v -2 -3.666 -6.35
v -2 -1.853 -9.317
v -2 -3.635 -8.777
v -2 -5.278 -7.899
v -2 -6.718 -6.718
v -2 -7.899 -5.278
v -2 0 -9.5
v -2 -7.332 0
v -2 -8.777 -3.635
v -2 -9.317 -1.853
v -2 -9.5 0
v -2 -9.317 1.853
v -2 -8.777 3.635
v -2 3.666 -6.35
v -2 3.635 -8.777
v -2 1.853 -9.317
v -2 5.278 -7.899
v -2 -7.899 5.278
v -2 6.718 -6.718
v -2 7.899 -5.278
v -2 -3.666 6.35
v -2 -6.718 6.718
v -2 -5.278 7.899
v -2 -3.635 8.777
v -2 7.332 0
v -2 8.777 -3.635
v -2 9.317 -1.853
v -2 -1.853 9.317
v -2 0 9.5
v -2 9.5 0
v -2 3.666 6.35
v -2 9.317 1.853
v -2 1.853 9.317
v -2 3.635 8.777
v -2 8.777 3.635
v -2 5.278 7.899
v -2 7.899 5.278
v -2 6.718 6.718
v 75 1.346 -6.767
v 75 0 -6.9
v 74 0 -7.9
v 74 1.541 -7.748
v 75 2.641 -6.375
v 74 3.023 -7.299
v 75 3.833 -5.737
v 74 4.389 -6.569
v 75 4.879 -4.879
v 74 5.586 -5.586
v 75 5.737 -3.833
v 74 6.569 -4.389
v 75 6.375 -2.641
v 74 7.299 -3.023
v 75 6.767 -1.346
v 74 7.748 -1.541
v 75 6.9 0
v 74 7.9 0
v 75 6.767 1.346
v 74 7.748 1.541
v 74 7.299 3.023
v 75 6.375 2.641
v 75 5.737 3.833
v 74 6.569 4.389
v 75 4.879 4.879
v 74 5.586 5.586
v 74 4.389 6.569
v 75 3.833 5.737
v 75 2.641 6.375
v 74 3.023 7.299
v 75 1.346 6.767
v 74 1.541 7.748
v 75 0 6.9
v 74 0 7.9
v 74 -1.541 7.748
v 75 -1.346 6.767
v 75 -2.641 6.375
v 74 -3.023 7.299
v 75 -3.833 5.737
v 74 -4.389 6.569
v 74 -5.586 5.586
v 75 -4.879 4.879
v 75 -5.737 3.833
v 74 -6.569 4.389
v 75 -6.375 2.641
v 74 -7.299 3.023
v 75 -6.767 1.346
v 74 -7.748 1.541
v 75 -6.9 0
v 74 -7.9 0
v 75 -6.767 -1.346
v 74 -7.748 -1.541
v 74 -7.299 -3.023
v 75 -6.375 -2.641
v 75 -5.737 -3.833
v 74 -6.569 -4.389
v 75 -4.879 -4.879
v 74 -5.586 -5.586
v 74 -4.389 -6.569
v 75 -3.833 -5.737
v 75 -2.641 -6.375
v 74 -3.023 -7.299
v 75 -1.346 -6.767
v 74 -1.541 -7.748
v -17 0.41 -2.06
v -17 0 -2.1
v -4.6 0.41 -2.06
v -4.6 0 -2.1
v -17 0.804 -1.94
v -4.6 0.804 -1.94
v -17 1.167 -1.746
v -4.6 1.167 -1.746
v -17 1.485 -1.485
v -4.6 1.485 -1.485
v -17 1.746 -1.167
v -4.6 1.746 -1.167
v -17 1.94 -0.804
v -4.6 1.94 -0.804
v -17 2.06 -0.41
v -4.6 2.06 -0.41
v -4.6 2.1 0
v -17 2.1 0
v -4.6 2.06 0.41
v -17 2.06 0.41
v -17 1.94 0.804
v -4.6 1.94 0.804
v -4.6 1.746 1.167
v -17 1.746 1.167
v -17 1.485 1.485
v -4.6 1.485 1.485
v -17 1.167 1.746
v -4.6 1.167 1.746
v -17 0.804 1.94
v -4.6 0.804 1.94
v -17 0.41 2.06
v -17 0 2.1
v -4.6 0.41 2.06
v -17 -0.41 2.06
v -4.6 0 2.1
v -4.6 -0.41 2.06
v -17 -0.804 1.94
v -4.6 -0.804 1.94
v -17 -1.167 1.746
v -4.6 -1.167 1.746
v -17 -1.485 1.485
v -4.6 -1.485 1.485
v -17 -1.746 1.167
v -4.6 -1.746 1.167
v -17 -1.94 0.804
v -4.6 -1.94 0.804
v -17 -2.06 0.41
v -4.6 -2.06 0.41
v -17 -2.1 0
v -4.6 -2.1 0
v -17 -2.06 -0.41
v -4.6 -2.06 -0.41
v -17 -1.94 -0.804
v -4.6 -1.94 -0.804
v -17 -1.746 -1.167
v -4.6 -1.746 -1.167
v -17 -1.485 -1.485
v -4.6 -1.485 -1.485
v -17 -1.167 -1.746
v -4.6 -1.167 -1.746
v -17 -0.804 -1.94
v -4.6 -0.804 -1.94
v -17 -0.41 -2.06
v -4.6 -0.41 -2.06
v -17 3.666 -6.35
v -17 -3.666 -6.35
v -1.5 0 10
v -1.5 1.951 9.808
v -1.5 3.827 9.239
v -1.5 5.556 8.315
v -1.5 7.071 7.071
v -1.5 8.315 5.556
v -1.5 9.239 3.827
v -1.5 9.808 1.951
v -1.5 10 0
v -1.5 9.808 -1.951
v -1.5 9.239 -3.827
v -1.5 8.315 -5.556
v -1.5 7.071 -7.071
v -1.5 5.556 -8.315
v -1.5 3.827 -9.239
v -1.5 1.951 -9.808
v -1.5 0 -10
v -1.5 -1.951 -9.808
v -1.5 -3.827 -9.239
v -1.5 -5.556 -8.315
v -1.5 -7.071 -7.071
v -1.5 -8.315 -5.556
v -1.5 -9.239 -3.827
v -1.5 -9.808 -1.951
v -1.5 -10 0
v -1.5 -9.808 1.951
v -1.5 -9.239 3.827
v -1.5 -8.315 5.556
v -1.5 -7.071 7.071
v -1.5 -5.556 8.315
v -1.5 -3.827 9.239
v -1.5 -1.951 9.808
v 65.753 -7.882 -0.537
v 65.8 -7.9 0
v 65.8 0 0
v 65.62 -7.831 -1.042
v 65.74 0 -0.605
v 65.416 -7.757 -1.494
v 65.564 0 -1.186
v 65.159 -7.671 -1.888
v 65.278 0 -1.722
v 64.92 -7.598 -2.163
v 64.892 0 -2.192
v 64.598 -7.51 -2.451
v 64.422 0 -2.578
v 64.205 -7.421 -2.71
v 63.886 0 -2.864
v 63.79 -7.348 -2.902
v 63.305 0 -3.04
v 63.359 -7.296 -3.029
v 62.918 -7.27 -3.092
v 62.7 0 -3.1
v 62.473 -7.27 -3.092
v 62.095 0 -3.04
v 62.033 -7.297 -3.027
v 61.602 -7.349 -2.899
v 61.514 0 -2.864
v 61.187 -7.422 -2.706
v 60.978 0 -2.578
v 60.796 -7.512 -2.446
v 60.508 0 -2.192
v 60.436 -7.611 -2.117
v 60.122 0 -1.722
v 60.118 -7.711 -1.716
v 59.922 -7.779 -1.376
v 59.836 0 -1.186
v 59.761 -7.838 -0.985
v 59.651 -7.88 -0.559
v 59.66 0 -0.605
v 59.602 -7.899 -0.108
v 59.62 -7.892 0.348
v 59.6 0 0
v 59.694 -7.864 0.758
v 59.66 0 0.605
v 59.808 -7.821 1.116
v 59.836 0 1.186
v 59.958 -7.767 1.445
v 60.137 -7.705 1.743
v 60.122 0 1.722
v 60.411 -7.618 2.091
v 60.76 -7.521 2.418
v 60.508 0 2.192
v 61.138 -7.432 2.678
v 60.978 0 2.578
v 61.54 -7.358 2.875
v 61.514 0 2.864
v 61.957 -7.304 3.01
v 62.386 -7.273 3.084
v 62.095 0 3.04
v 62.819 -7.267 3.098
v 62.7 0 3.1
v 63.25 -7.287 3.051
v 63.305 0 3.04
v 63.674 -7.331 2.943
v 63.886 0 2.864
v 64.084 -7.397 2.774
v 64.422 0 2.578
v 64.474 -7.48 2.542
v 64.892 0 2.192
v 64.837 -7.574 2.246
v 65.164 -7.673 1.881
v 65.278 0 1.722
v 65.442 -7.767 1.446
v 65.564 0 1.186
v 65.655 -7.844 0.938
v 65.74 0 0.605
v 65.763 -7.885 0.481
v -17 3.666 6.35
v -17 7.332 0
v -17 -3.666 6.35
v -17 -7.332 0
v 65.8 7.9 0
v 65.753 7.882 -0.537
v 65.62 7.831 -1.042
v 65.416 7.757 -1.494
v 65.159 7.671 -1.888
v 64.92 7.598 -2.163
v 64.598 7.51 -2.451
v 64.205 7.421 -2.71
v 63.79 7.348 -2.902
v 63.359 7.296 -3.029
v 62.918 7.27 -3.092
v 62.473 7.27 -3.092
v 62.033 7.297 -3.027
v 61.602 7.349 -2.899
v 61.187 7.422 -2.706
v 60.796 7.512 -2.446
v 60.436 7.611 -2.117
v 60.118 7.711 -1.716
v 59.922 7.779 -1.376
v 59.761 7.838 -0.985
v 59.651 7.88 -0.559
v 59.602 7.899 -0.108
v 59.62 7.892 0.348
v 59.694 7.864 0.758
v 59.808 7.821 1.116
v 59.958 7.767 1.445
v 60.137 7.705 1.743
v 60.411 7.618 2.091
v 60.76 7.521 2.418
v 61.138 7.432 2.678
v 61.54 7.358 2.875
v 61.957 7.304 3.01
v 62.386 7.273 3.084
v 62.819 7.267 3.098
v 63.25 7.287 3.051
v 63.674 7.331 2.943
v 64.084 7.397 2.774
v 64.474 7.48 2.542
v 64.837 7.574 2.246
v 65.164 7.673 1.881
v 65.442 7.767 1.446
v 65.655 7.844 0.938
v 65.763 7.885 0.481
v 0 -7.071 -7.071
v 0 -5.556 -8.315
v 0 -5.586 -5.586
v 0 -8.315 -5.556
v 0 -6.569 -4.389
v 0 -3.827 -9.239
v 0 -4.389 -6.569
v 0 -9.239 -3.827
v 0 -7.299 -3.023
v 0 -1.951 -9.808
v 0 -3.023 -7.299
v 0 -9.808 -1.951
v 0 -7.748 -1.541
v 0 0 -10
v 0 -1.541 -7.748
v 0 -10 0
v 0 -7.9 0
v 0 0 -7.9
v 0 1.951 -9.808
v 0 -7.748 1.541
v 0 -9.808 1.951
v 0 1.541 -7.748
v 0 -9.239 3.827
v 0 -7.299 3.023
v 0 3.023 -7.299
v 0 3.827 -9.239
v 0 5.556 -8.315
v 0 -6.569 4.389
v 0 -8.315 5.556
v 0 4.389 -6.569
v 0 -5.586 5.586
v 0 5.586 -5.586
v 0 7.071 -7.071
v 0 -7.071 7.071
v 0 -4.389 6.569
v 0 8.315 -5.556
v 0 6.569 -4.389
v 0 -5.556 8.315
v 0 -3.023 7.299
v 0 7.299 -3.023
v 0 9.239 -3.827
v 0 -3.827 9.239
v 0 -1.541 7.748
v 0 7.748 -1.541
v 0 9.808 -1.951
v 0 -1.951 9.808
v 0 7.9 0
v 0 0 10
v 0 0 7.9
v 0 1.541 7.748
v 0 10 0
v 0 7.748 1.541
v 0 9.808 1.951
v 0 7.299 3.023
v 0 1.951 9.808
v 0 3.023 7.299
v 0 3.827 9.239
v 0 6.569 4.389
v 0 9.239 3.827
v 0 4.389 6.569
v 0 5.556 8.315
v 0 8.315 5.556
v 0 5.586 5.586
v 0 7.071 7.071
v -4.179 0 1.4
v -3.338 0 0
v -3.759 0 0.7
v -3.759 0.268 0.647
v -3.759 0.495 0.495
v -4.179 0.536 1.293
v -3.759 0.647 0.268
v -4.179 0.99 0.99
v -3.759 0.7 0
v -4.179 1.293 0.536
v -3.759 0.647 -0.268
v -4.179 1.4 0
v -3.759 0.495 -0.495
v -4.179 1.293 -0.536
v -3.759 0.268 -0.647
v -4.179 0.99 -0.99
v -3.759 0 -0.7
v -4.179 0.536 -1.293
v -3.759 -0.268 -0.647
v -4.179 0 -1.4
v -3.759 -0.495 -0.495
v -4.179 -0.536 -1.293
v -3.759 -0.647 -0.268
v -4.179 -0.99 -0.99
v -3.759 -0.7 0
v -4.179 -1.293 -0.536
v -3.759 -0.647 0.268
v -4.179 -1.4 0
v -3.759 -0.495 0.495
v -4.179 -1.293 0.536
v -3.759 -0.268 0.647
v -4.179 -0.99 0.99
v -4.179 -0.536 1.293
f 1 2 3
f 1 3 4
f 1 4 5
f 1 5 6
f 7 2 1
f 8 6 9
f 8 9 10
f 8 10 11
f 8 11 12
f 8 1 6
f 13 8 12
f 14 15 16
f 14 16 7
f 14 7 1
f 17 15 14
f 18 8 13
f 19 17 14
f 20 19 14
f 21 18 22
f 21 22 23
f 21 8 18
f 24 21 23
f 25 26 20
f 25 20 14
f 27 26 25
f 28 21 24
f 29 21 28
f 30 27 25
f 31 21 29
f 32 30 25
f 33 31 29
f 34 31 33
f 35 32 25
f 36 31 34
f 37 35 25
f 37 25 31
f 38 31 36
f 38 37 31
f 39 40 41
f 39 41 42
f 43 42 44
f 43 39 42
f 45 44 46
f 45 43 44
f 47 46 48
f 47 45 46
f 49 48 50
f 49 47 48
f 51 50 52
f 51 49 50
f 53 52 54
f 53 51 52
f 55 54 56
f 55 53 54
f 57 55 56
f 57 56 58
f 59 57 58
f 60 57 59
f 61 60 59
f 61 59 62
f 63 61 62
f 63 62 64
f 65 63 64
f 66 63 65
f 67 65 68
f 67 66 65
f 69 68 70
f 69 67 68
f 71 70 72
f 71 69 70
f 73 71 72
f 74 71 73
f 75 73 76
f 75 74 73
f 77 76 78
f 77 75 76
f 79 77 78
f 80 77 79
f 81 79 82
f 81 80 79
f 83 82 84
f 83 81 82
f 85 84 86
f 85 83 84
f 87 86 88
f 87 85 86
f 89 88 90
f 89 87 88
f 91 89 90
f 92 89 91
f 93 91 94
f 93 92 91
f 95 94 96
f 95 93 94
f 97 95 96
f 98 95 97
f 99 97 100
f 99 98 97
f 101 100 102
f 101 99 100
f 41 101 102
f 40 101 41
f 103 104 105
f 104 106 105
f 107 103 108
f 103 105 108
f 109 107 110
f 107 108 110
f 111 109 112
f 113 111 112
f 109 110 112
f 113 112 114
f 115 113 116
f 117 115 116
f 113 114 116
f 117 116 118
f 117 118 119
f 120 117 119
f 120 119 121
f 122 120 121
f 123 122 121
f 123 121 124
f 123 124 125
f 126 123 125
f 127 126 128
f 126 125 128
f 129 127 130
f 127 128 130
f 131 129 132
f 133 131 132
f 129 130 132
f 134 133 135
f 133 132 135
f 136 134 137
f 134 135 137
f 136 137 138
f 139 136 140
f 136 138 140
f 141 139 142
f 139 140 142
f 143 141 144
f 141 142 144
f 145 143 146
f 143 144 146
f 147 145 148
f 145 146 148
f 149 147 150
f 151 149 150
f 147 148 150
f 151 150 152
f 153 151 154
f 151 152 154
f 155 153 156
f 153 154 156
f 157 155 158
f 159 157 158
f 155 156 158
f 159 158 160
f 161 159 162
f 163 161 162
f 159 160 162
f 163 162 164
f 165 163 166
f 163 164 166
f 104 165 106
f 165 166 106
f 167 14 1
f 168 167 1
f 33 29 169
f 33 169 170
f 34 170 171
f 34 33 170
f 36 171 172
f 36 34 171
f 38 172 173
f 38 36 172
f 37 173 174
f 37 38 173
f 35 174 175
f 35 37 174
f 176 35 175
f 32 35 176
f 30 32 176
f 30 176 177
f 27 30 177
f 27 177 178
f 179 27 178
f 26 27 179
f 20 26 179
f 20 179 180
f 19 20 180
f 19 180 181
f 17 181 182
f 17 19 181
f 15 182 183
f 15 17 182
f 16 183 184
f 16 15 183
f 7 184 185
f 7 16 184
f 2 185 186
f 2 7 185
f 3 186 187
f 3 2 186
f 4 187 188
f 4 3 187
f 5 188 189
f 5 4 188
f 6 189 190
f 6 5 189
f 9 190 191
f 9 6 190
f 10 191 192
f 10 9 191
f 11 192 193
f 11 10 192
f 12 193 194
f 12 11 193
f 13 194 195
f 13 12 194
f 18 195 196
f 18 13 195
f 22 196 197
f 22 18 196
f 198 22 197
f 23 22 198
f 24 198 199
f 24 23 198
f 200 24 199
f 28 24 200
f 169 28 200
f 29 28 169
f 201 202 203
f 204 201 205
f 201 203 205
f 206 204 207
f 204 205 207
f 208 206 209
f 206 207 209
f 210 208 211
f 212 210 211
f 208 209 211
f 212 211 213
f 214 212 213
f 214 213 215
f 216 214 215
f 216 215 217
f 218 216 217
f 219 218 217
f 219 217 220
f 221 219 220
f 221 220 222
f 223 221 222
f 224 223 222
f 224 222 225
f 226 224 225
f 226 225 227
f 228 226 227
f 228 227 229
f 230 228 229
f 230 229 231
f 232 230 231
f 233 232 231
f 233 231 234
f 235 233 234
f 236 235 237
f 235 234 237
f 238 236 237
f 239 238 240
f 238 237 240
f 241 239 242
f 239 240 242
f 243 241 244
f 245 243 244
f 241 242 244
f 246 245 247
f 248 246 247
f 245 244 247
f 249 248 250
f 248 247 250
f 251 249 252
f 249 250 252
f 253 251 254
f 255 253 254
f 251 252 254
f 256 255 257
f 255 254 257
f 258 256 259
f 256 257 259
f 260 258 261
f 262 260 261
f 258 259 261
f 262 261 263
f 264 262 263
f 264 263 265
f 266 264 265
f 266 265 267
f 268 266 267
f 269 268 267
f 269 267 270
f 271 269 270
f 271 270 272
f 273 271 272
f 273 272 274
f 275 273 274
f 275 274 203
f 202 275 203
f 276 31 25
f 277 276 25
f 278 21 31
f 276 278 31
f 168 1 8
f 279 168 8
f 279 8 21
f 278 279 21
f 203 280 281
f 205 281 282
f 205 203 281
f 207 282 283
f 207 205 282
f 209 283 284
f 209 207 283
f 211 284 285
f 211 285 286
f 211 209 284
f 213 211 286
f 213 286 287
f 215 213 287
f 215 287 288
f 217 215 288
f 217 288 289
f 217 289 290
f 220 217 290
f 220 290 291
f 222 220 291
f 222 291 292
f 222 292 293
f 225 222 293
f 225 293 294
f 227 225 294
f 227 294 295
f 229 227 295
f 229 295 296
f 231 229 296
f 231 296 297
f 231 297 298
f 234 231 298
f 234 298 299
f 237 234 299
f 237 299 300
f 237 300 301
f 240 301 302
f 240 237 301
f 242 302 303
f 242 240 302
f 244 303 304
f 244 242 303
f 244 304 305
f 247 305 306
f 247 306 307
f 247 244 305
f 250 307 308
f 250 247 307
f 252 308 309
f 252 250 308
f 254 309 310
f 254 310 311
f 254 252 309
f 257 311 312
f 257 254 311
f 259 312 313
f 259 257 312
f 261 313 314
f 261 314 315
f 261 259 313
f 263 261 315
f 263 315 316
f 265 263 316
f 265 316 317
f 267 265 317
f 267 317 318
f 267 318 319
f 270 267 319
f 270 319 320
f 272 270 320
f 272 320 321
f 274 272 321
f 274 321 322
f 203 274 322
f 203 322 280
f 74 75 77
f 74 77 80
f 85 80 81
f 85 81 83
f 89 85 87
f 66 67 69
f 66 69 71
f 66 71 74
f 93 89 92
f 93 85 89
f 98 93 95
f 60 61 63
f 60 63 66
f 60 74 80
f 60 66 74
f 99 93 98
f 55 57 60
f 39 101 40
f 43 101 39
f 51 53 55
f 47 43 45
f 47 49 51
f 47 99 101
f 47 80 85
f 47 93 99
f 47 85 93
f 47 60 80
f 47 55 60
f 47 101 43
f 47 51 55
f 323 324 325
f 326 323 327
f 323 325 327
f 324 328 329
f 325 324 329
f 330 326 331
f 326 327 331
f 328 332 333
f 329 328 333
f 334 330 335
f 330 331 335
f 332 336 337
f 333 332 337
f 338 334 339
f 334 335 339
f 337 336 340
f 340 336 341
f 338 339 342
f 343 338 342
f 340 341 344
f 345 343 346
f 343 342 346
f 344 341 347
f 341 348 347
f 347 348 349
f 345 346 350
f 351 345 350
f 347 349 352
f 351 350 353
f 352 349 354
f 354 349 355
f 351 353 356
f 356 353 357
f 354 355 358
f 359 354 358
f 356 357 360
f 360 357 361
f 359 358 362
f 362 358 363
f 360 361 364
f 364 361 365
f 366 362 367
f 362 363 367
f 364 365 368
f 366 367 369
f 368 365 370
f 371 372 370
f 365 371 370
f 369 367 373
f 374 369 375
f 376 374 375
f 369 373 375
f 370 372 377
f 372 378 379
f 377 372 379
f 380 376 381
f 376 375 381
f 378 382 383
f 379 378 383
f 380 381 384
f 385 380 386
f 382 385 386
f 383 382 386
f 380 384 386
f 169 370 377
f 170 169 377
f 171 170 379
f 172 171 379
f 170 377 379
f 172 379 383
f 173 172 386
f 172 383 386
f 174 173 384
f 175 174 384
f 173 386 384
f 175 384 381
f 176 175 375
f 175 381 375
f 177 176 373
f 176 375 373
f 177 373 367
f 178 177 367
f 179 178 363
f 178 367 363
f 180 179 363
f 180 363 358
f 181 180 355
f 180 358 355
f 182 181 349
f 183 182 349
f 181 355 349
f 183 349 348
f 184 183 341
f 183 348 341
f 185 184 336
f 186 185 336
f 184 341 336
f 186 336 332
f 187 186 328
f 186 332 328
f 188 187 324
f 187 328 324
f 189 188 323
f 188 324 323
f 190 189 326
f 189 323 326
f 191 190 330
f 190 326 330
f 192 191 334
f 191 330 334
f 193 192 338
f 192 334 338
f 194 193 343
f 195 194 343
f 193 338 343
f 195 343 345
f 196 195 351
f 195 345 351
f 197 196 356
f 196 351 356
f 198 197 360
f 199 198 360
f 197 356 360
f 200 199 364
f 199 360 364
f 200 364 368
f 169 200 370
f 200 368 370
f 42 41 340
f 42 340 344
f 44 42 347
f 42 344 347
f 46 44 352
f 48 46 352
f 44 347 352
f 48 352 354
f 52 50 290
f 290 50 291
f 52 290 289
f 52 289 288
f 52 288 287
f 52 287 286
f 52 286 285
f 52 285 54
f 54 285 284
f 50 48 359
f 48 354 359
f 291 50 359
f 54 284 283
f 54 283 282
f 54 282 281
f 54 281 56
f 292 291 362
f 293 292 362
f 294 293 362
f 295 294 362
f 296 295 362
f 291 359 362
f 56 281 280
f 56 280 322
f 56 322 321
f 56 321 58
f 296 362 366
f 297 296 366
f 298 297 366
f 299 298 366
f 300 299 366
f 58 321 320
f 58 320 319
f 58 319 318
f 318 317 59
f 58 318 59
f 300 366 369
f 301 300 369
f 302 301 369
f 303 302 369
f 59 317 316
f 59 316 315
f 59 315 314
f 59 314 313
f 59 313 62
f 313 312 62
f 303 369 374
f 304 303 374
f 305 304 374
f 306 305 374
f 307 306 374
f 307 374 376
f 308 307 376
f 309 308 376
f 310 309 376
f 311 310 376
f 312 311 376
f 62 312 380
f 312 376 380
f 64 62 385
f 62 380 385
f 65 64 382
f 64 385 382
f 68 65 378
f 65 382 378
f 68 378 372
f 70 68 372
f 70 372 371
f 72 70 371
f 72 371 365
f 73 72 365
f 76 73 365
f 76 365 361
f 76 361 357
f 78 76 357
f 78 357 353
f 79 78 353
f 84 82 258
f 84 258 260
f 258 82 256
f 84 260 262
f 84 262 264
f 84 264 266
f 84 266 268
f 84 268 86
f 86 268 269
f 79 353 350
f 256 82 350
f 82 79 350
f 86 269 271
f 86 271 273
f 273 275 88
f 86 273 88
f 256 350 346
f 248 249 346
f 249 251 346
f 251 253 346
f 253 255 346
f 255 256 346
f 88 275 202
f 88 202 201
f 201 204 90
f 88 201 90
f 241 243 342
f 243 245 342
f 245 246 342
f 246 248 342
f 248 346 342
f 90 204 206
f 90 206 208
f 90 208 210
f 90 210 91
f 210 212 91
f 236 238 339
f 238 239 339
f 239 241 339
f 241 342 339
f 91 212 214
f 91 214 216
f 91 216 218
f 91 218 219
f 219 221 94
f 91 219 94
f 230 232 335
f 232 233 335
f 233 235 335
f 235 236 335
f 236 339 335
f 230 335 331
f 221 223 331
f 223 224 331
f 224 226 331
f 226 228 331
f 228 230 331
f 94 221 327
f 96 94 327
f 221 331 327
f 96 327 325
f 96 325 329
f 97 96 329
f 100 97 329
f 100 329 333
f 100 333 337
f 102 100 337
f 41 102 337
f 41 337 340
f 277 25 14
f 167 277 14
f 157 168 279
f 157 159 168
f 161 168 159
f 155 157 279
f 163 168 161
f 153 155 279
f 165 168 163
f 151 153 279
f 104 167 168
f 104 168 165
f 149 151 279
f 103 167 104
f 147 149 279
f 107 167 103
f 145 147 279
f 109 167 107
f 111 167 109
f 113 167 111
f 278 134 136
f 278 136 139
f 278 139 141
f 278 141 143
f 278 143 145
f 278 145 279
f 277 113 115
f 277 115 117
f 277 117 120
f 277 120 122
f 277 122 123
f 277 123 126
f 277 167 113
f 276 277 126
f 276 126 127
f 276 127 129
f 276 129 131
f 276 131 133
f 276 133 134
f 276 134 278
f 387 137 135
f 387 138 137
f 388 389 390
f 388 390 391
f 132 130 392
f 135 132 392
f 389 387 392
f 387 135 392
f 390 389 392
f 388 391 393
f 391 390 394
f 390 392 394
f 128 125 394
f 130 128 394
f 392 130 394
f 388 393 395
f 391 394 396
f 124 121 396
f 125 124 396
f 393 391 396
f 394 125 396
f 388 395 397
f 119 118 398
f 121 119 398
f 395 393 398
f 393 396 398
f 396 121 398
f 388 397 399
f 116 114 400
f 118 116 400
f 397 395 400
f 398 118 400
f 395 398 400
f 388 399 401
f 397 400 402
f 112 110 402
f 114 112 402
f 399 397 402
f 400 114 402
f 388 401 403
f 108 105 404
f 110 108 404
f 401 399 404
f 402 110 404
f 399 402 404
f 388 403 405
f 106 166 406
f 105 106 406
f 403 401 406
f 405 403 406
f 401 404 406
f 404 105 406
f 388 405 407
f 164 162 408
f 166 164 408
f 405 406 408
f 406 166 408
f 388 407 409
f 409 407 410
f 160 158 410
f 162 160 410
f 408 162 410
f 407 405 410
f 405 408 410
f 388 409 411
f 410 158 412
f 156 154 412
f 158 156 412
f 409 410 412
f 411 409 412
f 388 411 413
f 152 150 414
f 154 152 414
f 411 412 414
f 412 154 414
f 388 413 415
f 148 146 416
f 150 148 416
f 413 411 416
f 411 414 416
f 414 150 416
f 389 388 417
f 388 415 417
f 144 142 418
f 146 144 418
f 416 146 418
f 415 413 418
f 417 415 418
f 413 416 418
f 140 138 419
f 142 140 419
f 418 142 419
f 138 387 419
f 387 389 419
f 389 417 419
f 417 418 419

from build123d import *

# Parameters (mm, degrees)
SKETCH_1_R               = 7.9
EXTRUDE_1_DEPTH          = 75
SKETCH_3_R               = 10
EXTRUDE_2_DEPTH          = 2
EXTRUDE_3_DEPTH          = 15
CHAMFER_1_SIZE           = 0.5
M5X0_8_1_D               = 4.2
M5X0_8_1_DEPTH           = 12.4
M5X0_8_1_TIP             = 1.2618073
SKETCH_5_R               = 3.1
CUT_EXTRUDE_1_DEPTH      = 11
CUT_EXTRUDE_1_DEPTH_BACK = 11
CHAMFER_2_SIZE           = 1


with BuildPart() as part:
    # 草图1 → 凸台-拉伸1 (new body)
    with BuildSketch(Plane(origin=(0, 0, 0), x_dir=(0, 0, -1), z_dir=(1, 0, 0))):
        Circle(SKETCH_1_R)
    extrude(amount=EXTRUDE_1_DEPTH)

    # 草图3 → 凸台-拉伸2 (add)
    with BuildSketch(Plane.ZY):
        Circle(SKETCH_3_R)
    extrude(amount=EXTRUDE_2_DEPTH)

    # 草图4 → 凸台-拉伸3 (add)
    with BuildSketch(Plane.ZY.offset(2)):
        Polygon((6.35, 3.666174209), (0, 7.332348419), (-6.35, 3.666174209), (-6.35, -3.666174209), (0, -7.332348419), (6.35, -3.666174209), align=None)
    extrude(amount=EXTRUDE_3_DEPTH)

    # 倒角1
    chamfer_1_edges = [part.edges().sort_by_distance(p)[0] for p in [
        (-2, 0, -10),
    ]]
    chamfer(chamfer_1_edges, length=CHAMFER_1_SIZE)

    # M5x0.8 螺纹孔1
    with Locations(Plane.ZY.offset(17)):
        with Locations((0, 0)):
            Hole(M5X0_8_1_D / 2, depth=M5X0_8_1_DEPTH)
            with Locations((0, 0, -(M5X0_8_1_DEPTH + M5X0_8_1_TIP / 2))):  # 118° drill point
                Cone(0, M5X0_8_1_D / 2, M5X0_8_1_TIP, mode=Mode.SUBTRACT)

    # 草图5 → 切除-拉伸1 (cut, two sides)
    with BuildSketch(Plane(origin=(0, 0, 0), x_dir=(1, 0, 0), z_dir=(0, 1, 0))) as cut_extrude_1_sk:
        with Locations((62.7, 0)):
            Circle(SKETCH_5_R)
    extrude(amount=CUT_EXTRUDE_1_DEPTH, mode=Mode.SUBTRACT)
    extrude(cut_extrude_1_sk.sketch, amount=-CUT_EXTRUDE_1_DEPTH_BACK, mode=Mode.SUBTRACT)

    # 倒角2
    chamfer_2_edges = [part.edges().sort_by_distance(p)[0] for p in [
        (75, 0, 7.9),
    ]]
    chamfer(chamfer_2_edges, length=CHAMFER_2_SIZE)


solid = part.part
